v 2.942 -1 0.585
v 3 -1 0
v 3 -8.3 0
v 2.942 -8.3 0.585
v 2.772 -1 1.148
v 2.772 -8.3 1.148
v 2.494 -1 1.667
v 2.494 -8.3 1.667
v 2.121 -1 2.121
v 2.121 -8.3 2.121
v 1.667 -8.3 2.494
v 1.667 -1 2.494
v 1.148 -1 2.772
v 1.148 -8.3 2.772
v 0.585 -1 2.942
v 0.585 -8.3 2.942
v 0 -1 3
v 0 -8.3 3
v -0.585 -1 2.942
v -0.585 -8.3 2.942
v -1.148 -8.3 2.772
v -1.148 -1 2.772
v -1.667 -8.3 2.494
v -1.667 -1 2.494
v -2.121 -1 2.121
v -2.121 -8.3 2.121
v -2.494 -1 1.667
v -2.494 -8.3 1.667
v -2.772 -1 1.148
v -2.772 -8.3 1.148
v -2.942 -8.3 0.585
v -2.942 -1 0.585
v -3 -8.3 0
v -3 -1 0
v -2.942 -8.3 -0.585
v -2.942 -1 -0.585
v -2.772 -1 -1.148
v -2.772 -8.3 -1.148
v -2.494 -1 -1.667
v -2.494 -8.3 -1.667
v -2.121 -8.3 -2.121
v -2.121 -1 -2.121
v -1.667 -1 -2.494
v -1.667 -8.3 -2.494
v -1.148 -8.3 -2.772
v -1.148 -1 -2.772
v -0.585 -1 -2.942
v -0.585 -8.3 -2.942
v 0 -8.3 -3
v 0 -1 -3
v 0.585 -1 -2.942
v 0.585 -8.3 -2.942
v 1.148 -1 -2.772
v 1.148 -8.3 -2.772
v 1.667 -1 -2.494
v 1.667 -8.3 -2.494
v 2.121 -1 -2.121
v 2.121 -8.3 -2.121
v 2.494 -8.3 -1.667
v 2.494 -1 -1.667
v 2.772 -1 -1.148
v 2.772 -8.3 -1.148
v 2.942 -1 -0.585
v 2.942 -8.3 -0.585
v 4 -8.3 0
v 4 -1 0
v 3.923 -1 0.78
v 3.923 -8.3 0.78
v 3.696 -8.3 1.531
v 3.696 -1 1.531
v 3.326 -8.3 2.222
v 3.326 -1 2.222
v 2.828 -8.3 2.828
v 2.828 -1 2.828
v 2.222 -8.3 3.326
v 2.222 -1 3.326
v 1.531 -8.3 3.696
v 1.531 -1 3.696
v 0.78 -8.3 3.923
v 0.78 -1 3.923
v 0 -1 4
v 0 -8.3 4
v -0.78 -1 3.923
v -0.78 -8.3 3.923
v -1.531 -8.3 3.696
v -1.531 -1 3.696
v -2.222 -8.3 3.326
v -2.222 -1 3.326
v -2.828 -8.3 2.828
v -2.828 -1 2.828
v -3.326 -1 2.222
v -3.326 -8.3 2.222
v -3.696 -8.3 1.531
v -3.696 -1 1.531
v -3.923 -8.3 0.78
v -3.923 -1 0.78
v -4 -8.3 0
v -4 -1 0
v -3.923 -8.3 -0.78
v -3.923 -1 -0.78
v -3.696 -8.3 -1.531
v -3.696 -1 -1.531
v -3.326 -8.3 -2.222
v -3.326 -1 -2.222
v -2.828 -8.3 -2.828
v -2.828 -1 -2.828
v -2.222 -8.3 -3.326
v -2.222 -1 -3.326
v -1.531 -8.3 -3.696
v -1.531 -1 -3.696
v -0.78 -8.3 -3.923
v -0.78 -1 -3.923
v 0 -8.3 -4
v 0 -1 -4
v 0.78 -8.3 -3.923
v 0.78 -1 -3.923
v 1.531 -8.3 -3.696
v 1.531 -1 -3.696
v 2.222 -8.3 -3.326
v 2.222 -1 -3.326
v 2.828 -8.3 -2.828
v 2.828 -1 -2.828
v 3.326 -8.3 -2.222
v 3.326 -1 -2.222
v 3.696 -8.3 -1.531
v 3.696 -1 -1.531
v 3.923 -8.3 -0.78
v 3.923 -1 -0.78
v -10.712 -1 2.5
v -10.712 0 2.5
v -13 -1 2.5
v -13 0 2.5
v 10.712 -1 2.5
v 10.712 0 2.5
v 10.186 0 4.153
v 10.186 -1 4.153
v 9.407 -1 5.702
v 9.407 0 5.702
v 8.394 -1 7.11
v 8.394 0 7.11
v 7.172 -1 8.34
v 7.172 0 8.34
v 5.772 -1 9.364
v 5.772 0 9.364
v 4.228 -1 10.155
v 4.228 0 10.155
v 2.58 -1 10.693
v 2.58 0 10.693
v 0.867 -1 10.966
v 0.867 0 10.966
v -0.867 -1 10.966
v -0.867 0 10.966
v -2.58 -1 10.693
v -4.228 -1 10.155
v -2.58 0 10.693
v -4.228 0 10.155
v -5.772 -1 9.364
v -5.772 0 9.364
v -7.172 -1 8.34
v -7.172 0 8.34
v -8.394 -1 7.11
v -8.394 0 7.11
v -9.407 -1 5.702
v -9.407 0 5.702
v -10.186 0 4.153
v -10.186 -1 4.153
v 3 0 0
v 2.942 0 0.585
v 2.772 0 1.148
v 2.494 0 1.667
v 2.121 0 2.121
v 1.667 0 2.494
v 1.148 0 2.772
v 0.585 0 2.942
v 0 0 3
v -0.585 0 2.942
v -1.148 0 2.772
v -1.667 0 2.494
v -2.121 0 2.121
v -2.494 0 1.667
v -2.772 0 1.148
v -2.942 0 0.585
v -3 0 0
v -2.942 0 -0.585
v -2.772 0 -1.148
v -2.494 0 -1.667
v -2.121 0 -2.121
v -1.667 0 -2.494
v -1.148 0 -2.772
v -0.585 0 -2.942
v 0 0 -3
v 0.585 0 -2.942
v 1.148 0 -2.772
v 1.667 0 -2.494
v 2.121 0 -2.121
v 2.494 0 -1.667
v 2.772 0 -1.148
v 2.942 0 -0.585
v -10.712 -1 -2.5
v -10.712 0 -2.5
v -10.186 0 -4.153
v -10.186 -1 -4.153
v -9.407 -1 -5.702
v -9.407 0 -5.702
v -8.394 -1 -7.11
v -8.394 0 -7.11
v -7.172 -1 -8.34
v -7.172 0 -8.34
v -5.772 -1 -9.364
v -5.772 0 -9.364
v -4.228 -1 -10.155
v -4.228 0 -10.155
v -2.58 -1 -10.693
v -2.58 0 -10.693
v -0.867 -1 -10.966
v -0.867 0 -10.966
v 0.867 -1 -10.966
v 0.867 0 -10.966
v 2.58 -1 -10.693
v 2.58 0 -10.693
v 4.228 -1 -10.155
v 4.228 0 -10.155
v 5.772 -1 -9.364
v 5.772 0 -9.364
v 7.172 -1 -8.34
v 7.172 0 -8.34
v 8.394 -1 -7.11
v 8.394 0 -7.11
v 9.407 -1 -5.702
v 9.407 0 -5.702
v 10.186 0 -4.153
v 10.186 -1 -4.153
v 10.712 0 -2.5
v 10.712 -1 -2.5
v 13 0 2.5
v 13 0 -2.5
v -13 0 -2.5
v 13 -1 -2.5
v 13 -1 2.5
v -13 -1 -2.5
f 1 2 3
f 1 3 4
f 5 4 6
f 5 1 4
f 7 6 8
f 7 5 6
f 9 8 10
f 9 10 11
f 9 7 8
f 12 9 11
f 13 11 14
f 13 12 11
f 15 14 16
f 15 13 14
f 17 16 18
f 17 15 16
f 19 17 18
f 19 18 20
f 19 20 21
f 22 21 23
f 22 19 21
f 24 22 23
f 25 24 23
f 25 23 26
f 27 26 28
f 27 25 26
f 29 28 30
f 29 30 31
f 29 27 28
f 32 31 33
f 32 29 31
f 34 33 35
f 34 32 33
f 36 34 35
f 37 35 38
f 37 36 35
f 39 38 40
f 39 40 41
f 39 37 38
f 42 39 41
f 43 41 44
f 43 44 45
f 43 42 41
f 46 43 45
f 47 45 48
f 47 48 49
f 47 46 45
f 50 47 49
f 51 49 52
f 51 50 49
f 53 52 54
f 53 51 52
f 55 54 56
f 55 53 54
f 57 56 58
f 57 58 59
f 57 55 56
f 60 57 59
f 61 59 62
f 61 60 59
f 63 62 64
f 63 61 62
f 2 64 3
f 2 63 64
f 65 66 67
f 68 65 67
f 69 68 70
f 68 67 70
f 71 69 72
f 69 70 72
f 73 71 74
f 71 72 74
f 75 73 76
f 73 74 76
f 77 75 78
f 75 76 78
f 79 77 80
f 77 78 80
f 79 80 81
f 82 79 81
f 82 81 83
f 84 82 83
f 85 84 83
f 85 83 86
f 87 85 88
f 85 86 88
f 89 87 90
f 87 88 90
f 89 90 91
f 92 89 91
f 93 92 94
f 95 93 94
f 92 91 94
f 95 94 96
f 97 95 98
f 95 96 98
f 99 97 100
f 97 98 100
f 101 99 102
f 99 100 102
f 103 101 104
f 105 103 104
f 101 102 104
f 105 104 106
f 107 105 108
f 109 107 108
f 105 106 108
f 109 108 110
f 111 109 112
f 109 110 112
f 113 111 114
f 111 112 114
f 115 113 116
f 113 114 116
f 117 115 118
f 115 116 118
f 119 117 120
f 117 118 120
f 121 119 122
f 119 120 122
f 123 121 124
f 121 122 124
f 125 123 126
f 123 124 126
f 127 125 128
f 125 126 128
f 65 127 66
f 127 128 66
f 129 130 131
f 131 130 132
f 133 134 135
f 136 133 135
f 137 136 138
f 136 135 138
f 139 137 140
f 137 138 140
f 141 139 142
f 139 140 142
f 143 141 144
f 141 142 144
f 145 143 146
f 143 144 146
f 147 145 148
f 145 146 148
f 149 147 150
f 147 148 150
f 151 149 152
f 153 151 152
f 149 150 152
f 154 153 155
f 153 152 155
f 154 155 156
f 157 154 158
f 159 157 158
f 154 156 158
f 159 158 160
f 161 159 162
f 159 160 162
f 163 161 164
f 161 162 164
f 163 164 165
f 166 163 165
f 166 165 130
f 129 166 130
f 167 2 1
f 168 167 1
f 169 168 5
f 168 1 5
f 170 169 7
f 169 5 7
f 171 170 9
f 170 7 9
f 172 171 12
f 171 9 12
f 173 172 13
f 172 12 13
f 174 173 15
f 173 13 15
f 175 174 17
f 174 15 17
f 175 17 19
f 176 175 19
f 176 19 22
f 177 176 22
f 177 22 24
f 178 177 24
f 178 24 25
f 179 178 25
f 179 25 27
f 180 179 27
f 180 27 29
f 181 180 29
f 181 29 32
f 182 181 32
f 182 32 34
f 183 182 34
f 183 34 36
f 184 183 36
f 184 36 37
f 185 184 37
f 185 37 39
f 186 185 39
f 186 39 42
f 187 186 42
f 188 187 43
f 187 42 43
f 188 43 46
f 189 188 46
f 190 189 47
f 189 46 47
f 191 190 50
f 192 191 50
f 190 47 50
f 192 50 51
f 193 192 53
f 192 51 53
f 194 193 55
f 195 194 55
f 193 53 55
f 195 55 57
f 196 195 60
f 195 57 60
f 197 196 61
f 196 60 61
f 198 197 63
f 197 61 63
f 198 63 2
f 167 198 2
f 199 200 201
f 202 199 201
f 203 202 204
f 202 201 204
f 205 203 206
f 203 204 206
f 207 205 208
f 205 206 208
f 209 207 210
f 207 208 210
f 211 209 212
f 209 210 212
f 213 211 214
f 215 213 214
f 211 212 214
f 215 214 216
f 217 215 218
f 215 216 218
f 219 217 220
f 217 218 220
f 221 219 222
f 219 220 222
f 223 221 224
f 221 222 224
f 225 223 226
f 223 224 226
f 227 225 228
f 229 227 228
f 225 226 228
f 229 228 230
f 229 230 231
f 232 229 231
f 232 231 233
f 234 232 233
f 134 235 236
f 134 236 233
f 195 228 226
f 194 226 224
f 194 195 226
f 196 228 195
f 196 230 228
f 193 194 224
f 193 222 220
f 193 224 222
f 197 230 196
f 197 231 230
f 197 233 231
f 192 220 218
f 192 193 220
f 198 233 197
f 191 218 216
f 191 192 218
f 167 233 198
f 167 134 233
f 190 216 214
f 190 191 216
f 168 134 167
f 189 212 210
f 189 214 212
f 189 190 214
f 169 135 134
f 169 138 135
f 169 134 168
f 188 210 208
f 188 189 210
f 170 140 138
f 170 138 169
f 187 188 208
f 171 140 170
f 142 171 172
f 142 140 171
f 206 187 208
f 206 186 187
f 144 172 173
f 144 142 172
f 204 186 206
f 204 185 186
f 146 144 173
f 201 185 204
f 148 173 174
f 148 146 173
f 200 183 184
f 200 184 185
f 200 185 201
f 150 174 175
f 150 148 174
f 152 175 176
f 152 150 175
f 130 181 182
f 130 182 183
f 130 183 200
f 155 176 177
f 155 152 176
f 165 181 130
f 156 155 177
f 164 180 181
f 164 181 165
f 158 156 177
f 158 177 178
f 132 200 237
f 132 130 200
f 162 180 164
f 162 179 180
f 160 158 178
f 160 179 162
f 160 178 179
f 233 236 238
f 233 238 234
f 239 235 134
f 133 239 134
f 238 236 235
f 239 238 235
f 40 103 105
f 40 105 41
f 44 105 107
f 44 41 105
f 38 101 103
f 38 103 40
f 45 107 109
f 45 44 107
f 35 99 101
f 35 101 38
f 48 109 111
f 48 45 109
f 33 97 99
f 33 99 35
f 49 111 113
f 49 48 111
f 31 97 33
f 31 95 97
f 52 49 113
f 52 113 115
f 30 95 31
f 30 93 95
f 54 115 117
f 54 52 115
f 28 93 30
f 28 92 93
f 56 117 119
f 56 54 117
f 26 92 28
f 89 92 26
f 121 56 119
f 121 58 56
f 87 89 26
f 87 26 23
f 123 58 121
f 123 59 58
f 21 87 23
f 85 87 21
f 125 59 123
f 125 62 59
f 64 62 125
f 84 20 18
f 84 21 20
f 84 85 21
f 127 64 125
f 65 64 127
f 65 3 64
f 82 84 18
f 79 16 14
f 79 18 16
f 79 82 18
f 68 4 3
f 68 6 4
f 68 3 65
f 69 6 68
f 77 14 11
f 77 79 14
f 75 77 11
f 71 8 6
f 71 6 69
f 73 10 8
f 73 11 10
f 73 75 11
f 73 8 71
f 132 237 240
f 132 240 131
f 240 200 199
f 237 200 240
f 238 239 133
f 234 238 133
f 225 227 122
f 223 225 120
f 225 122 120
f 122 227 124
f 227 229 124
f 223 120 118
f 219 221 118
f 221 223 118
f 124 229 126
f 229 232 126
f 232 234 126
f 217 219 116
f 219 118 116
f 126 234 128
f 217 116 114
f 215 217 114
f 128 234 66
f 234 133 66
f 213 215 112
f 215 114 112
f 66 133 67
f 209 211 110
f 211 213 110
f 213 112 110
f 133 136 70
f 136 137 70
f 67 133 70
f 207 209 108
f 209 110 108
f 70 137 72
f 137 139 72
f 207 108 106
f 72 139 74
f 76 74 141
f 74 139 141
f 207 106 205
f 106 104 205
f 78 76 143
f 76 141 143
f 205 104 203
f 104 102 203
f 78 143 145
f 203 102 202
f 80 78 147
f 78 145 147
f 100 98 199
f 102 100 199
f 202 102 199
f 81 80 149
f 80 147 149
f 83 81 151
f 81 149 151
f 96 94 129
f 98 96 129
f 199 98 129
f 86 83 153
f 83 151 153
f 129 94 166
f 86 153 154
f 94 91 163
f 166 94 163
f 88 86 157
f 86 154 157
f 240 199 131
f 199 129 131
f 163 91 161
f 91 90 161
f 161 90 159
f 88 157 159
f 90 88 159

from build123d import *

# Parameters (mm, degrees)
F0_R          = 11
F1_DEPTH      = 1
F3_W          = 26
F3_H          = 5
F4_DEPTH      = 1
F5_R          = 4
F5_R_2        = 3
F7_DEPTH      = 7.3
F6_R          = 3
F8_DEPTH      = 7.301
F8_DEPTH_BACK = 1.001


with BuildPart() as f1:
    # F0 (on Front) → F1 (new body)
    with BuildSketch(Plane.XZ):
        Circle(F0_R)
    extrude(amount=F1_DEPTH)

    # F3 (on face) → F4 (join)
    with BuildSketch(Plane(origin=(0, 0, 0), x_dir=(-1, 0, 0), z_dir=(0, 1, 0))):
        Rectangle(F3_W, F3_H)
    extrude(amount=-F4_DEPTH)

    # F5 (on face) → F7 (join)
    with BuildSketch(Plane.XZ.offset(1)):
        Circle(F5_R)
        Circle(F5_R_2, mode=Mode.SUBTRACT)
    extrude(amount=F7_DEPTH)

    # F6 (on face) → F8 (cut, two sides)
    with BuildSketch(Plane.XZ.offset(1)) as f8_sk:
        Circle(F6_R)
    extrude(amount=F8_DEPTH, mode=Mode.SUBTRACT)
    extrude(f8_sk.sketch, amount=-F8_DEPTH_BACK, mode=Mode.SUBTRACT)


solid = f1.part
